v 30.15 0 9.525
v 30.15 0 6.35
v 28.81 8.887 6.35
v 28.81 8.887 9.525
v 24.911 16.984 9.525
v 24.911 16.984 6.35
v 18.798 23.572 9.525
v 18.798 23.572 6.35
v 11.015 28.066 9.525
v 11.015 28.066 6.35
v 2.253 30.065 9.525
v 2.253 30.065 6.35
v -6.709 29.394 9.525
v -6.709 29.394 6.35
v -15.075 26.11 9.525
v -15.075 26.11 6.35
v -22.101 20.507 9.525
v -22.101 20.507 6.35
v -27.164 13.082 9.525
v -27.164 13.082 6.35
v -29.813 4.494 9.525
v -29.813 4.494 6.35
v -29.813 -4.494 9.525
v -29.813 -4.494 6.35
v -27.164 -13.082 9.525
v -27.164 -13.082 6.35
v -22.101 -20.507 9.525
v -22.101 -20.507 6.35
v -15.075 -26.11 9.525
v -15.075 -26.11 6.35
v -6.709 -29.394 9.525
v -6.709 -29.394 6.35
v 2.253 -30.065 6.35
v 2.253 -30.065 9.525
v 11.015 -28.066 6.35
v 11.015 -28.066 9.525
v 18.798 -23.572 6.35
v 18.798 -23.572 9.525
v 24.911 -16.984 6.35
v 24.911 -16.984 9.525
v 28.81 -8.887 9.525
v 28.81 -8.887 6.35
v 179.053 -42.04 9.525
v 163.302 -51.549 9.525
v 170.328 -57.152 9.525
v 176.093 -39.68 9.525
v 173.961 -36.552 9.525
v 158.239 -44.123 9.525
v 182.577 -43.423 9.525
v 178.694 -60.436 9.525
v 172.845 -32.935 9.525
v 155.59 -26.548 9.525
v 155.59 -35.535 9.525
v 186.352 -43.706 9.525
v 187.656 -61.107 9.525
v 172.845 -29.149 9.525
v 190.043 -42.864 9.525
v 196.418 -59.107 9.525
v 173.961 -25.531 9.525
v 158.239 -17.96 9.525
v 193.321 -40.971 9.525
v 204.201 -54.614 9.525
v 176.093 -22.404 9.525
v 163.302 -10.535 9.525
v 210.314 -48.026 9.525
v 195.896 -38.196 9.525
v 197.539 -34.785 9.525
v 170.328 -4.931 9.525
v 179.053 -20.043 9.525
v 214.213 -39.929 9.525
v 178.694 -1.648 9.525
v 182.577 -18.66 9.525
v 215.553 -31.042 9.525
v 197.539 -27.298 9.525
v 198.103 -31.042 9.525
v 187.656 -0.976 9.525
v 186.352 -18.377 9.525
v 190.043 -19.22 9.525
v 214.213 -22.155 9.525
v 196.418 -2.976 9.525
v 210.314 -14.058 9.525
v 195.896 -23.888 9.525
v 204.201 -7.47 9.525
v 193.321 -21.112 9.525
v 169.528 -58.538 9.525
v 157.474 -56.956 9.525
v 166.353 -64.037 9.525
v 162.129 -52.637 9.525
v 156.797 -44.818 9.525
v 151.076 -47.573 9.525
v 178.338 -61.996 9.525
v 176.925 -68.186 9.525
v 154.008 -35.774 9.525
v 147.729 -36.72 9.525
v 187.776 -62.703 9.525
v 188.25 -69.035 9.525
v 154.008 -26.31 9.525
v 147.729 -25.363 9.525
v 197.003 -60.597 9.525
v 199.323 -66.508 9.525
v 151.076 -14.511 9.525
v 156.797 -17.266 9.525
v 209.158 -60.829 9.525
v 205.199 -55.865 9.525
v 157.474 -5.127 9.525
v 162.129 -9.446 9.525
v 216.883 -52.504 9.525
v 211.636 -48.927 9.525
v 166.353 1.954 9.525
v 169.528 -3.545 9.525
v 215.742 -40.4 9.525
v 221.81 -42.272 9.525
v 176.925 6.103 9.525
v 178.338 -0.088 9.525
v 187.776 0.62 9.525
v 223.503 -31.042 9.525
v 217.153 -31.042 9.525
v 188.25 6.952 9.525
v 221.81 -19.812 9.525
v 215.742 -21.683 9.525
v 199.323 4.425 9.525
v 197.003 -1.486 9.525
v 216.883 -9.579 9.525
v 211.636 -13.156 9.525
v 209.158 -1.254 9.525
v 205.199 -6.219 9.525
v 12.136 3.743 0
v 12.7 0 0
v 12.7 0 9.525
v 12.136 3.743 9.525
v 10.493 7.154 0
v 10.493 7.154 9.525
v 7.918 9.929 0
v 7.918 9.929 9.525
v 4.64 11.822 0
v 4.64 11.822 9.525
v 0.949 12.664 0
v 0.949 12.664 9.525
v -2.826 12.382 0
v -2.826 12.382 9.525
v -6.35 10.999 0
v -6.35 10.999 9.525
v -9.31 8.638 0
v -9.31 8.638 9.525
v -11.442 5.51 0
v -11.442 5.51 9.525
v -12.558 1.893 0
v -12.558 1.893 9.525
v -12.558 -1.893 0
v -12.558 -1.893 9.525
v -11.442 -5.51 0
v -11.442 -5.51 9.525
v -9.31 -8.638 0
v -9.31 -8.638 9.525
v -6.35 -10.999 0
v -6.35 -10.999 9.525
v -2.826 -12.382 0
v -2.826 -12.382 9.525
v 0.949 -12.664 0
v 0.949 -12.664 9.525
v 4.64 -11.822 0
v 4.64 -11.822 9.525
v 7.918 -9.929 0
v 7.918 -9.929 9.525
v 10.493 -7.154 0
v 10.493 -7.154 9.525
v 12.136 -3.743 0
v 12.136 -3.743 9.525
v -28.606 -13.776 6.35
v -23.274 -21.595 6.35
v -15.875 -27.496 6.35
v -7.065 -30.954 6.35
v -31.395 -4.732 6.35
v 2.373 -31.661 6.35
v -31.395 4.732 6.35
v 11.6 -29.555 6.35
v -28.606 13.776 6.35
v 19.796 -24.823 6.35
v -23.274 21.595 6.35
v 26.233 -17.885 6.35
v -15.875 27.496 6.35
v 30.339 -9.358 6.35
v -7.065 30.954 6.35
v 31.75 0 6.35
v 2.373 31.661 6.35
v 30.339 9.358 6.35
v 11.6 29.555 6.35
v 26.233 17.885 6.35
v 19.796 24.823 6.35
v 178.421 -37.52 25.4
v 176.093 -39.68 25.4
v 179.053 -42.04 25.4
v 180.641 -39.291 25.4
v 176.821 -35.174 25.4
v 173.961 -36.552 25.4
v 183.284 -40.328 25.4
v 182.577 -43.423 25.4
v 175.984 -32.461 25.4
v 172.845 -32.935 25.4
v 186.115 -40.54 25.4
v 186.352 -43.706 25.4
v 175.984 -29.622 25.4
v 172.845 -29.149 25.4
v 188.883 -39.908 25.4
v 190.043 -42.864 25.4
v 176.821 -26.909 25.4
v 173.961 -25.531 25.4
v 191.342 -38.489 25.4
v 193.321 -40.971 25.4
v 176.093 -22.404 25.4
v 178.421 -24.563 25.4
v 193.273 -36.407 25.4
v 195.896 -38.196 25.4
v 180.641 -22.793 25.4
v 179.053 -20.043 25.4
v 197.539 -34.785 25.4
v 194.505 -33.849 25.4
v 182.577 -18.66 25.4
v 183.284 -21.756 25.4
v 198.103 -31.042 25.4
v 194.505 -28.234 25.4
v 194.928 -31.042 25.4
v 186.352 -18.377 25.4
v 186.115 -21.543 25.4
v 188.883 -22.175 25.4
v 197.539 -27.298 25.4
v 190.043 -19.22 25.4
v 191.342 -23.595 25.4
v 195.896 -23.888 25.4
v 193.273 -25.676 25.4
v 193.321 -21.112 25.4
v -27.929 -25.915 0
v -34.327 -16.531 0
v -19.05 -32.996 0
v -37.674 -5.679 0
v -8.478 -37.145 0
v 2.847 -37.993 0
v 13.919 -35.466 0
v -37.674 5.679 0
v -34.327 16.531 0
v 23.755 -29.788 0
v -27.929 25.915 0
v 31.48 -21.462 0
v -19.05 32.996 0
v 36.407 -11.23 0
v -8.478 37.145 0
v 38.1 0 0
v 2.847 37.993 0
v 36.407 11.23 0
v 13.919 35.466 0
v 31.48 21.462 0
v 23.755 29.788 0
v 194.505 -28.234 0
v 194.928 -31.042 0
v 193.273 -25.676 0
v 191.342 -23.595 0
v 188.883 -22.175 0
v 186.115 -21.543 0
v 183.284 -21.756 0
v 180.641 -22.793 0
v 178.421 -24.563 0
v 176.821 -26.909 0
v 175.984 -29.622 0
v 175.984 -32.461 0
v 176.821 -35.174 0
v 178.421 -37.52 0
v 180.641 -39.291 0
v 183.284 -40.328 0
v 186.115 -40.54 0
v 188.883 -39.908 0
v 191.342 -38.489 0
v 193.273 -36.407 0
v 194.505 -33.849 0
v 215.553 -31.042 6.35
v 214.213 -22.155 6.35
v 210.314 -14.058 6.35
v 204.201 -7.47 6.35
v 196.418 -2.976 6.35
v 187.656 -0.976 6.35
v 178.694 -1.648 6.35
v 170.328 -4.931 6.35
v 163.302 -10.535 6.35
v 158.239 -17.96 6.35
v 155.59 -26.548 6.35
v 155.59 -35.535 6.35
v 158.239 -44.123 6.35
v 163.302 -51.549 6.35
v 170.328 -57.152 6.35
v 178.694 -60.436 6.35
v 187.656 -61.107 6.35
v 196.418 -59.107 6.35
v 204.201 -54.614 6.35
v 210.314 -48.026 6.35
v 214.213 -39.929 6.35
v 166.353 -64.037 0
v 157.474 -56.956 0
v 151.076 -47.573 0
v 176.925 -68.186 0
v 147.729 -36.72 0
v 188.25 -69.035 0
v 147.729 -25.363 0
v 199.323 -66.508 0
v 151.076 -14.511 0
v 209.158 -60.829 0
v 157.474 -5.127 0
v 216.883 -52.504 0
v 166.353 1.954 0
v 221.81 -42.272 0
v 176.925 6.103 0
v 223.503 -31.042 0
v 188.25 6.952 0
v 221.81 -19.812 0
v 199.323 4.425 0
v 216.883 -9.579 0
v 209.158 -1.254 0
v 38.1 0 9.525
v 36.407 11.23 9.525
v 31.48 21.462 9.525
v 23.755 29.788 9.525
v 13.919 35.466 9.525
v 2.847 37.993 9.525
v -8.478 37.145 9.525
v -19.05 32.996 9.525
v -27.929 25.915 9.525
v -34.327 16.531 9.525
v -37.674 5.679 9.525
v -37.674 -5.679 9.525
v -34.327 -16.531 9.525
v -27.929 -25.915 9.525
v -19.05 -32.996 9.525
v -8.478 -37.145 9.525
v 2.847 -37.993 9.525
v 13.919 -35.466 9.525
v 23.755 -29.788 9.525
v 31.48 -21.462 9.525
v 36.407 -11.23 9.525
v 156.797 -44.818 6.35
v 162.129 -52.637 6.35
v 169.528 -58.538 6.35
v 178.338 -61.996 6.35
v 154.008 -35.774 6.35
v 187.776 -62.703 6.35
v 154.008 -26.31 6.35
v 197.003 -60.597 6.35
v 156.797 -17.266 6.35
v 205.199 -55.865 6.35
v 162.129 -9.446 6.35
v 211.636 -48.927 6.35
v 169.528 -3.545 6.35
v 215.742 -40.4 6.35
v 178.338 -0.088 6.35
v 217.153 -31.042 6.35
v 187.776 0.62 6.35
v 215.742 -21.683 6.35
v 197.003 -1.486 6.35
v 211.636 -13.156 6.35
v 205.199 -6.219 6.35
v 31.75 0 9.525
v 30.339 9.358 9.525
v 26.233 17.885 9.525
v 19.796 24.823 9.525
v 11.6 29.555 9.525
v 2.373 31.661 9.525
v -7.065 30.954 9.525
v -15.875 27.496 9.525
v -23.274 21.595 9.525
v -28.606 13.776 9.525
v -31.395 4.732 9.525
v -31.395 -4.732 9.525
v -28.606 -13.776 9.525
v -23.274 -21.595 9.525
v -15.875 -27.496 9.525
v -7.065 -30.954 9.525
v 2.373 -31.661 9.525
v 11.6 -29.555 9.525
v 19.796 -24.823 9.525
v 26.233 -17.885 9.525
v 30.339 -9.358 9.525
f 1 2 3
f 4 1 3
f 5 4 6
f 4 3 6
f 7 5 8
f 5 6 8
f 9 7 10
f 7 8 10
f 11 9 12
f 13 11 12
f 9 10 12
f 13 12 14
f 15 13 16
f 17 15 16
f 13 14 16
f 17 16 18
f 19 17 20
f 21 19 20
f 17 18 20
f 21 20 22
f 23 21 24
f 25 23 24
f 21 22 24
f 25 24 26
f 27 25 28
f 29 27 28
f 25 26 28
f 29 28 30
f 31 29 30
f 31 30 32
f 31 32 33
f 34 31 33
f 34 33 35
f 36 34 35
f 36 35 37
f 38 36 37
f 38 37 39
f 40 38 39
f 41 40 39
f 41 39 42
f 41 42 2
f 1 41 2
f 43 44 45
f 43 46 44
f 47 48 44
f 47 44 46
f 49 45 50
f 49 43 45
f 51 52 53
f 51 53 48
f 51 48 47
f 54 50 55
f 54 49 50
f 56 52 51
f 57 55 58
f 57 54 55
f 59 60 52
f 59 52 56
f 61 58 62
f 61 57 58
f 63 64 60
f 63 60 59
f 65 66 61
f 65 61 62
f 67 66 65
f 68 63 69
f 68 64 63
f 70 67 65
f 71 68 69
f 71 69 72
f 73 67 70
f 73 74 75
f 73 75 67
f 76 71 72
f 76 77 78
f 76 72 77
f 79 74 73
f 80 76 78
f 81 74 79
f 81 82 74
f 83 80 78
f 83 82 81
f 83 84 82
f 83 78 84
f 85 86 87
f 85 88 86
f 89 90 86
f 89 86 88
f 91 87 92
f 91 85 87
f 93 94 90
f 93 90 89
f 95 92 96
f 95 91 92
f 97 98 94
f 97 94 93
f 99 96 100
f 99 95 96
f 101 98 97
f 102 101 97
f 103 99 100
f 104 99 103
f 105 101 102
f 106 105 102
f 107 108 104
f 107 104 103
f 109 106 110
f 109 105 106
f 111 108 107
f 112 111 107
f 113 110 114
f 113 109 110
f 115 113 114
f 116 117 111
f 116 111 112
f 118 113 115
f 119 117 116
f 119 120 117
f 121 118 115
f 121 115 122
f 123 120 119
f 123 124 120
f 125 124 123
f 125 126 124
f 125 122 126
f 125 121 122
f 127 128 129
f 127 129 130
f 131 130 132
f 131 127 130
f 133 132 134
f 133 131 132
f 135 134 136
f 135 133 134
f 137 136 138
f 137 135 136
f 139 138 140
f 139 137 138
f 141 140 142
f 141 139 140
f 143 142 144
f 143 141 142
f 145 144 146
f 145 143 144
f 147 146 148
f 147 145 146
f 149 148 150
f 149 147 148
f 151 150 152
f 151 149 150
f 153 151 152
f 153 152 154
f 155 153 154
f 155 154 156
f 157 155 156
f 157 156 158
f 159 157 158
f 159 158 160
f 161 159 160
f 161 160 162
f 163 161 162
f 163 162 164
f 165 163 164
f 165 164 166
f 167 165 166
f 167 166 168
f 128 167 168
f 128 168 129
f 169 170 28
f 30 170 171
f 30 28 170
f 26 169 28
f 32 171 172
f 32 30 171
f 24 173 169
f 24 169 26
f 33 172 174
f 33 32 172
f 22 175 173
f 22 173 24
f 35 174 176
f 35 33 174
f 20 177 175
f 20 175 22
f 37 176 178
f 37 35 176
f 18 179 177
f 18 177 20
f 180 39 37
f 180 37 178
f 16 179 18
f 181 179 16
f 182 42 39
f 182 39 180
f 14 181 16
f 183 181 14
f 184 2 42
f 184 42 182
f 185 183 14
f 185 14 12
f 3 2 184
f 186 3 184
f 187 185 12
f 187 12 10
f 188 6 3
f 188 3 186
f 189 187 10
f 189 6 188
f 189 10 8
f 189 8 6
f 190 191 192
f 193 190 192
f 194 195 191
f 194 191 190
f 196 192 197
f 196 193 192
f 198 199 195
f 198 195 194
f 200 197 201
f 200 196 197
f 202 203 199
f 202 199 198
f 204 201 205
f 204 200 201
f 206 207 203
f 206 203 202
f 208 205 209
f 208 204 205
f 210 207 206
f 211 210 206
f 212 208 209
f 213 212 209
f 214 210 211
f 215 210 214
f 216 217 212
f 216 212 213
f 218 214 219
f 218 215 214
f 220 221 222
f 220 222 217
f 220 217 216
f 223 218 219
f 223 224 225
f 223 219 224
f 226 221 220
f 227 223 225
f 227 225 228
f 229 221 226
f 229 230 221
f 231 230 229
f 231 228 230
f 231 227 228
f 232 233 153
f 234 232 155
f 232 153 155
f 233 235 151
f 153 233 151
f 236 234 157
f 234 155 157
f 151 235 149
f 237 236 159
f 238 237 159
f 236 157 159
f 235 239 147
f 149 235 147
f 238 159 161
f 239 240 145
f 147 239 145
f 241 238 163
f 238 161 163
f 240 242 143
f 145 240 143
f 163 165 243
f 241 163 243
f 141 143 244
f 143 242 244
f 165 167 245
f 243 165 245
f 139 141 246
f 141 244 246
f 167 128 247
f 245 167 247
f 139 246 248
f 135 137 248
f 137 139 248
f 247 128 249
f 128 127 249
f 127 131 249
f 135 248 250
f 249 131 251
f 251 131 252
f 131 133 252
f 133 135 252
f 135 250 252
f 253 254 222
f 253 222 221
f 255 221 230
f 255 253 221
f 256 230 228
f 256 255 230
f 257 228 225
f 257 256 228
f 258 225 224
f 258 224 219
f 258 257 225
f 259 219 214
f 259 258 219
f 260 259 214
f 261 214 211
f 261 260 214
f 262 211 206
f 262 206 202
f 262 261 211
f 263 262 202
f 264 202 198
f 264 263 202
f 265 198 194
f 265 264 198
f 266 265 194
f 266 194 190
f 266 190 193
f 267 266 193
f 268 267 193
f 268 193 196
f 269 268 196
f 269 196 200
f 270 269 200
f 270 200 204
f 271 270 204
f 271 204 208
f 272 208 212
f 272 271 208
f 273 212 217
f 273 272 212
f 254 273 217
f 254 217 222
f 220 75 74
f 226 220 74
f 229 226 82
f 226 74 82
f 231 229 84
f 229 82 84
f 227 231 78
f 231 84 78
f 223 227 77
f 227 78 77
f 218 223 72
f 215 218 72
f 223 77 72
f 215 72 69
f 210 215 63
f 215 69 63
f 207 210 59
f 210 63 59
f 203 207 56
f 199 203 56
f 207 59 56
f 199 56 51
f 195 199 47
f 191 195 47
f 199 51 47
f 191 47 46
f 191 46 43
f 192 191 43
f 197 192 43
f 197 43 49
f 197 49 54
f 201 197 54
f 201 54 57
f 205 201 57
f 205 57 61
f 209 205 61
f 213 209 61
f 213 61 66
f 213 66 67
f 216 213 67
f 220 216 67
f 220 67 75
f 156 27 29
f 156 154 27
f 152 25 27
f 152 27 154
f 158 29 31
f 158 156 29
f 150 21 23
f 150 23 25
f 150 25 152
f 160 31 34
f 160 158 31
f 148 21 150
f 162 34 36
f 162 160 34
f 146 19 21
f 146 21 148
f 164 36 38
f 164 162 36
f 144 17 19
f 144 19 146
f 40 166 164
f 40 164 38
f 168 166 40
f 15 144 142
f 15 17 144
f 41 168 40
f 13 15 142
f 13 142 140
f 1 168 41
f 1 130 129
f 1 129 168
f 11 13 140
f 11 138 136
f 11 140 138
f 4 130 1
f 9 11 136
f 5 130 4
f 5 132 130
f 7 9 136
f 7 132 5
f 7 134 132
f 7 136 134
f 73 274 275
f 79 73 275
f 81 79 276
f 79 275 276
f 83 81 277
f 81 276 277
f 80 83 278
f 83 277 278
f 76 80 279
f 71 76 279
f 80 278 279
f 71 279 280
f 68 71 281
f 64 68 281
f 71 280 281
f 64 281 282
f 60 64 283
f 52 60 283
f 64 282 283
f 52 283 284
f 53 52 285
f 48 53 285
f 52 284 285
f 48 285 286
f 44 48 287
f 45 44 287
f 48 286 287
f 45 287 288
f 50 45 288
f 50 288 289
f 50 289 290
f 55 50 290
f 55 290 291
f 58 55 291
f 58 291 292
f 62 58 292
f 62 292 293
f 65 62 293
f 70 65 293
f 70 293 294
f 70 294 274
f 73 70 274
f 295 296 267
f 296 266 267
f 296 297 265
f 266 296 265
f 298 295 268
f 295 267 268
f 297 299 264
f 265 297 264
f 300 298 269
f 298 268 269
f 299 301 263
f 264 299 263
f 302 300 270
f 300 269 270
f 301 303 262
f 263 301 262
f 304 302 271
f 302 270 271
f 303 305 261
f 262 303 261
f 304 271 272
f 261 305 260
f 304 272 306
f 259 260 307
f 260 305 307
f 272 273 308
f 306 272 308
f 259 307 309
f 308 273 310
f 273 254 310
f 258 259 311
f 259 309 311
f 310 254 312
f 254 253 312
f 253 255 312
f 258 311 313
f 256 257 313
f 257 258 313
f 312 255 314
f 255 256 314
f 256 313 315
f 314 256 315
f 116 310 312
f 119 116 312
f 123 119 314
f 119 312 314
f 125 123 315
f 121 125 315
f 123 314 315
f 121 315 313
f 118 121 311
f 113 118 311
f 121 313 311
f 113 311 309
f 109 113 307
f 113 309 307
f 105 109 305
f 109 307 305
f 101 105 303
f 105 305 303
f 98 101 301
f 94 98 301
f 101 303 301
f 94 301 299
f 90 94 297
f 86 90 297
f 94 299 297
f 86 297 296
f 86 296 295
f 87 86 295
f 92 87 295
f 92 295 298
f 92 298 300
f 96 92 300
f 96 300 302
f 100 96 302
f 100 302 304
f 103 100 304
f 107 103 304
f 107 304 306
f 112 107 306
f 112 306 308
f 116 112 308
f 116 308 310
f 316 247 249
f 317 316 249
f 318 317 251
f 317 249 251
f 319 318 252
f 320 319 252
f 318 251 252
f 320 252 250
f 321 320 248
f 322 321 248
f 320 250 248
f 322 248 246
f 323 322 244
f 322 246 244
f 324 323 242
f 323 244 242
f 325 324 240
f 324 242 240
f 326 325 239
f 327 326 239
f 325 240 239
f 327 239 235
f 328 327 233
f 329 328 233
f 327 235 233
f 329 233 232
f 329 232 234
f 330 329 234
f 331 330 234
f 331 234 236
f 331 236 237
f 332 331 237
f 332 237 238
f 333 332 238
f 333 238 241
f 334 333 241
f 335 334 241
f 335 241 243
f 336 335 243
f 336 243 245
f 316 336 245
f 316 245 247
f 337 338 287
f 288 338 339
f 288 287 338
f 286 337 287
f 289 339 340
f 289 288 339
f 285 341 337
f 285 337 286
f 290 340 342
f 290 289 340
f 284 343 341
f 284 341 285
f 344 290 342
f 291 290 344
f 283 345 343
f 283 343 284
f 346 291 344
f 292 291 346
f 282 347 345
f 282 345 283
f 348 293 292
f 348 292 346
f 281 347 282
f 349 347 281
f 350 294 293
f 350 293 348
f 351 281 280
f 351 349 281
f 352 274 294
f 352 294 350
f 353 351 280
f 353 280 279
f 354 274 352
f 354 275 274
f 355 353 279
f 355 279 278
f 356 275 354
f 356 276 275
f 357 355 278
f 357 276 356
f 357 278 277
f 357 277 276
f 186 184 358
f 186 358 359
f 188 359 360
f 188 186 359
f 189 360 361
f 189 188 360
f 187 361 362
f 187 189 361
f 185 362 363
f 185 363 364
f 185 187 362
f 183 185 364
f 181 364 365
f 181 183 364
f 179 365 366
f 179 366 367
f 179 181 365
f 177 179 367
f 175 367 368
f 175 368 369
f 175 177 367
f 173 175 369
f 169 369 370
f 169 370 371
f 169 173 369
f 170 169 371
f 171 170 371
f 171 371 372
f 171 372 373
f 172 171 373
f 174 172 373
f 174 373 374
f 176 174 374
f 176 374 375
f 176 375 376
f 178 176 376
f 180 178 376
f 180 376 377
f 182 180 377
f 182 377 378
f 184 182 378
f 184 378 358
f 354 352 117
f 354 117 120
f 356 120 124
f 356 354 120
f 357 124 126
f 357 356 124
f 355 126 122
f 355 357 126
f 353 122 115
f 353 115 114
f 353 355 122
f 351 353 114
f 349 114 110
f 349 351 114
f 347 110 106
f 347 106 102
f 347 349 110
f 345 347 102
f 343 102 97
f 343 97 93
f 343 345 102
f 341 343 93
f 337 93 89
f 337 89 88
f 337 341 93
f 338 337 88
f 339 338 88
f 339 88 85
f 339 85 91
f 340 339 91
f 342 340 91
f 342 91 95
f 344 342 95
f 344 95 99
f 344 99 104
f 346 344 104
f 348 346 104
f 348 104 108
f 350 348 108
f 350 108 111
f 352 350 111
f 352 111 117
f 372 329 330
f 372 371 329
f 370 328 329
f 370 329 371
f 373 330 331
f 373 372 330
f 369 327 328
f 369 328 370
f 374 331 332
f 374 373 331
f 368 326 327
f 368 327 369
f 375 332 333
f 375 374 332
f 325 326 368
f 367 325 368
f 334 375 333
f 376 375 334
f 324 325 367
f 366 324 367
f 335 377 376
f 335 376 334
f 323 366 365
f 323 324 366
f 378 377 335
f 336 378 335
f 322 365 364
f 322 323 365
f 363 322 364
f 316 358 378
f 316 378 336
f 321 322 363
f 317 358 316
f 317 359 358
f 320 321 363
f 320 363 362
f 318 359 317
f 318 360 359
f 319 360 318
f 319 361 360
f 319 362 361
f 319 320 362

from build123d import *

# Parameters (mm, degrees)
F0_R     = 38.1
F0_R_2   = 31.75
F0_R_3   = 30.1498
F0_R_4   = 12.7
F1_DEPTH = 6.35
F2_DEPTH = 9.525
F3_R     = 38.1
F3_R_2   = 31.75
F3_R_3   = 30.1498
F3_R_4   = 12.7
F4_DEPTH = 6.35
F5_DEPTH = 9.525
F3_R_5   = 9.525
F6_DEPTH = 25.4


with BuildPart() as f1:
    # F0 (on Top) → F1 (new body)
    with BuildSketch(Plane.XY):
        Circle(F0_R)
        Circle(F0_R_2, mode=Mode.SUBTRACT)
        Circle(F0_R_2)
        Circle(F0_R_3, mode=Mode.SUBTRACT)
        Circle(F0_R_3)
        Circle(F0_R_4, mode=Mode.SUBTRACT)
    extrude(amount=F1_DEPTH)

    # F0 (on Top) → F2 (join)
    with BuildSketch(Plane.XY):
        Circle(F0_R)
        Circle(F0_R_2, mode=Mode.SUBTRACT)
        Circle(F0_R_3)
        Circle(F0_R_4, mode=Mode.SUBTRACT)
    extrude(amount=F2_DEPTH)


with BuildPart() as f4:
    # F3 (on Top) → F4 (new body)
    with BuildSketch(Plane.XY):
        with Locations((185.4030489922, -31.0417152941)):
            Circle(F3_R)
        with Locations((185.4030489922, -31.0417152941)):
            Circle(F3_R_2, mode=Mode.SUBTRACT)
        with Locations((185.4030489922, -31.0417152941)):
            Circle(F3_R_2)
        with Locations((185.4030489922, -31.0417152941)):
            Circle(F3_R_3, mode=Mode.SUBTRACT)
        with Locations((185.4030489922, -31.0417152941)):
            Circle(F3_R_3)
        with Locations((185.4030489922, -31.0417152941)):
            Circle(F3_R_4, mode=Mode.SUBTRACT)
    extrude(amount=F4_DEPTH)

    # F3 (on Top) → F5 (join)
    with BuildSketch(Plane.XY):
        with Locations((185.4030489922, -31.0417152941)):
            Circle(F3_R)
        with Locations((185.4030489922, -31.0417152941)):
            Circle(F3_R_2, mode=Mode.SUBTRACT)
        with Locations((185.4030489922, -31.0417152941)):
            Circle(F3_R_3)
        with Locations((185.4030489922, -31.0417152941)):
            Circle(F3_R_4, mode=Mode.SUBTRACT)
    extrude(amount=F5_DEPTH)

    # F3 (on Top) → F6 (join)
    with BuildSketch(Plane.XY):
        with Locations((185.4030489922, -31.0417152941)):
            Circle(F3_R_4)
        with Locations((185.4030489922, -31.0417152941)):
            Circle(F3_R_5, mode=Mode.SUBTRACT)
    extrude(amount=F6_DEPTH)


solid = Compound([f1.part, f4.part])
